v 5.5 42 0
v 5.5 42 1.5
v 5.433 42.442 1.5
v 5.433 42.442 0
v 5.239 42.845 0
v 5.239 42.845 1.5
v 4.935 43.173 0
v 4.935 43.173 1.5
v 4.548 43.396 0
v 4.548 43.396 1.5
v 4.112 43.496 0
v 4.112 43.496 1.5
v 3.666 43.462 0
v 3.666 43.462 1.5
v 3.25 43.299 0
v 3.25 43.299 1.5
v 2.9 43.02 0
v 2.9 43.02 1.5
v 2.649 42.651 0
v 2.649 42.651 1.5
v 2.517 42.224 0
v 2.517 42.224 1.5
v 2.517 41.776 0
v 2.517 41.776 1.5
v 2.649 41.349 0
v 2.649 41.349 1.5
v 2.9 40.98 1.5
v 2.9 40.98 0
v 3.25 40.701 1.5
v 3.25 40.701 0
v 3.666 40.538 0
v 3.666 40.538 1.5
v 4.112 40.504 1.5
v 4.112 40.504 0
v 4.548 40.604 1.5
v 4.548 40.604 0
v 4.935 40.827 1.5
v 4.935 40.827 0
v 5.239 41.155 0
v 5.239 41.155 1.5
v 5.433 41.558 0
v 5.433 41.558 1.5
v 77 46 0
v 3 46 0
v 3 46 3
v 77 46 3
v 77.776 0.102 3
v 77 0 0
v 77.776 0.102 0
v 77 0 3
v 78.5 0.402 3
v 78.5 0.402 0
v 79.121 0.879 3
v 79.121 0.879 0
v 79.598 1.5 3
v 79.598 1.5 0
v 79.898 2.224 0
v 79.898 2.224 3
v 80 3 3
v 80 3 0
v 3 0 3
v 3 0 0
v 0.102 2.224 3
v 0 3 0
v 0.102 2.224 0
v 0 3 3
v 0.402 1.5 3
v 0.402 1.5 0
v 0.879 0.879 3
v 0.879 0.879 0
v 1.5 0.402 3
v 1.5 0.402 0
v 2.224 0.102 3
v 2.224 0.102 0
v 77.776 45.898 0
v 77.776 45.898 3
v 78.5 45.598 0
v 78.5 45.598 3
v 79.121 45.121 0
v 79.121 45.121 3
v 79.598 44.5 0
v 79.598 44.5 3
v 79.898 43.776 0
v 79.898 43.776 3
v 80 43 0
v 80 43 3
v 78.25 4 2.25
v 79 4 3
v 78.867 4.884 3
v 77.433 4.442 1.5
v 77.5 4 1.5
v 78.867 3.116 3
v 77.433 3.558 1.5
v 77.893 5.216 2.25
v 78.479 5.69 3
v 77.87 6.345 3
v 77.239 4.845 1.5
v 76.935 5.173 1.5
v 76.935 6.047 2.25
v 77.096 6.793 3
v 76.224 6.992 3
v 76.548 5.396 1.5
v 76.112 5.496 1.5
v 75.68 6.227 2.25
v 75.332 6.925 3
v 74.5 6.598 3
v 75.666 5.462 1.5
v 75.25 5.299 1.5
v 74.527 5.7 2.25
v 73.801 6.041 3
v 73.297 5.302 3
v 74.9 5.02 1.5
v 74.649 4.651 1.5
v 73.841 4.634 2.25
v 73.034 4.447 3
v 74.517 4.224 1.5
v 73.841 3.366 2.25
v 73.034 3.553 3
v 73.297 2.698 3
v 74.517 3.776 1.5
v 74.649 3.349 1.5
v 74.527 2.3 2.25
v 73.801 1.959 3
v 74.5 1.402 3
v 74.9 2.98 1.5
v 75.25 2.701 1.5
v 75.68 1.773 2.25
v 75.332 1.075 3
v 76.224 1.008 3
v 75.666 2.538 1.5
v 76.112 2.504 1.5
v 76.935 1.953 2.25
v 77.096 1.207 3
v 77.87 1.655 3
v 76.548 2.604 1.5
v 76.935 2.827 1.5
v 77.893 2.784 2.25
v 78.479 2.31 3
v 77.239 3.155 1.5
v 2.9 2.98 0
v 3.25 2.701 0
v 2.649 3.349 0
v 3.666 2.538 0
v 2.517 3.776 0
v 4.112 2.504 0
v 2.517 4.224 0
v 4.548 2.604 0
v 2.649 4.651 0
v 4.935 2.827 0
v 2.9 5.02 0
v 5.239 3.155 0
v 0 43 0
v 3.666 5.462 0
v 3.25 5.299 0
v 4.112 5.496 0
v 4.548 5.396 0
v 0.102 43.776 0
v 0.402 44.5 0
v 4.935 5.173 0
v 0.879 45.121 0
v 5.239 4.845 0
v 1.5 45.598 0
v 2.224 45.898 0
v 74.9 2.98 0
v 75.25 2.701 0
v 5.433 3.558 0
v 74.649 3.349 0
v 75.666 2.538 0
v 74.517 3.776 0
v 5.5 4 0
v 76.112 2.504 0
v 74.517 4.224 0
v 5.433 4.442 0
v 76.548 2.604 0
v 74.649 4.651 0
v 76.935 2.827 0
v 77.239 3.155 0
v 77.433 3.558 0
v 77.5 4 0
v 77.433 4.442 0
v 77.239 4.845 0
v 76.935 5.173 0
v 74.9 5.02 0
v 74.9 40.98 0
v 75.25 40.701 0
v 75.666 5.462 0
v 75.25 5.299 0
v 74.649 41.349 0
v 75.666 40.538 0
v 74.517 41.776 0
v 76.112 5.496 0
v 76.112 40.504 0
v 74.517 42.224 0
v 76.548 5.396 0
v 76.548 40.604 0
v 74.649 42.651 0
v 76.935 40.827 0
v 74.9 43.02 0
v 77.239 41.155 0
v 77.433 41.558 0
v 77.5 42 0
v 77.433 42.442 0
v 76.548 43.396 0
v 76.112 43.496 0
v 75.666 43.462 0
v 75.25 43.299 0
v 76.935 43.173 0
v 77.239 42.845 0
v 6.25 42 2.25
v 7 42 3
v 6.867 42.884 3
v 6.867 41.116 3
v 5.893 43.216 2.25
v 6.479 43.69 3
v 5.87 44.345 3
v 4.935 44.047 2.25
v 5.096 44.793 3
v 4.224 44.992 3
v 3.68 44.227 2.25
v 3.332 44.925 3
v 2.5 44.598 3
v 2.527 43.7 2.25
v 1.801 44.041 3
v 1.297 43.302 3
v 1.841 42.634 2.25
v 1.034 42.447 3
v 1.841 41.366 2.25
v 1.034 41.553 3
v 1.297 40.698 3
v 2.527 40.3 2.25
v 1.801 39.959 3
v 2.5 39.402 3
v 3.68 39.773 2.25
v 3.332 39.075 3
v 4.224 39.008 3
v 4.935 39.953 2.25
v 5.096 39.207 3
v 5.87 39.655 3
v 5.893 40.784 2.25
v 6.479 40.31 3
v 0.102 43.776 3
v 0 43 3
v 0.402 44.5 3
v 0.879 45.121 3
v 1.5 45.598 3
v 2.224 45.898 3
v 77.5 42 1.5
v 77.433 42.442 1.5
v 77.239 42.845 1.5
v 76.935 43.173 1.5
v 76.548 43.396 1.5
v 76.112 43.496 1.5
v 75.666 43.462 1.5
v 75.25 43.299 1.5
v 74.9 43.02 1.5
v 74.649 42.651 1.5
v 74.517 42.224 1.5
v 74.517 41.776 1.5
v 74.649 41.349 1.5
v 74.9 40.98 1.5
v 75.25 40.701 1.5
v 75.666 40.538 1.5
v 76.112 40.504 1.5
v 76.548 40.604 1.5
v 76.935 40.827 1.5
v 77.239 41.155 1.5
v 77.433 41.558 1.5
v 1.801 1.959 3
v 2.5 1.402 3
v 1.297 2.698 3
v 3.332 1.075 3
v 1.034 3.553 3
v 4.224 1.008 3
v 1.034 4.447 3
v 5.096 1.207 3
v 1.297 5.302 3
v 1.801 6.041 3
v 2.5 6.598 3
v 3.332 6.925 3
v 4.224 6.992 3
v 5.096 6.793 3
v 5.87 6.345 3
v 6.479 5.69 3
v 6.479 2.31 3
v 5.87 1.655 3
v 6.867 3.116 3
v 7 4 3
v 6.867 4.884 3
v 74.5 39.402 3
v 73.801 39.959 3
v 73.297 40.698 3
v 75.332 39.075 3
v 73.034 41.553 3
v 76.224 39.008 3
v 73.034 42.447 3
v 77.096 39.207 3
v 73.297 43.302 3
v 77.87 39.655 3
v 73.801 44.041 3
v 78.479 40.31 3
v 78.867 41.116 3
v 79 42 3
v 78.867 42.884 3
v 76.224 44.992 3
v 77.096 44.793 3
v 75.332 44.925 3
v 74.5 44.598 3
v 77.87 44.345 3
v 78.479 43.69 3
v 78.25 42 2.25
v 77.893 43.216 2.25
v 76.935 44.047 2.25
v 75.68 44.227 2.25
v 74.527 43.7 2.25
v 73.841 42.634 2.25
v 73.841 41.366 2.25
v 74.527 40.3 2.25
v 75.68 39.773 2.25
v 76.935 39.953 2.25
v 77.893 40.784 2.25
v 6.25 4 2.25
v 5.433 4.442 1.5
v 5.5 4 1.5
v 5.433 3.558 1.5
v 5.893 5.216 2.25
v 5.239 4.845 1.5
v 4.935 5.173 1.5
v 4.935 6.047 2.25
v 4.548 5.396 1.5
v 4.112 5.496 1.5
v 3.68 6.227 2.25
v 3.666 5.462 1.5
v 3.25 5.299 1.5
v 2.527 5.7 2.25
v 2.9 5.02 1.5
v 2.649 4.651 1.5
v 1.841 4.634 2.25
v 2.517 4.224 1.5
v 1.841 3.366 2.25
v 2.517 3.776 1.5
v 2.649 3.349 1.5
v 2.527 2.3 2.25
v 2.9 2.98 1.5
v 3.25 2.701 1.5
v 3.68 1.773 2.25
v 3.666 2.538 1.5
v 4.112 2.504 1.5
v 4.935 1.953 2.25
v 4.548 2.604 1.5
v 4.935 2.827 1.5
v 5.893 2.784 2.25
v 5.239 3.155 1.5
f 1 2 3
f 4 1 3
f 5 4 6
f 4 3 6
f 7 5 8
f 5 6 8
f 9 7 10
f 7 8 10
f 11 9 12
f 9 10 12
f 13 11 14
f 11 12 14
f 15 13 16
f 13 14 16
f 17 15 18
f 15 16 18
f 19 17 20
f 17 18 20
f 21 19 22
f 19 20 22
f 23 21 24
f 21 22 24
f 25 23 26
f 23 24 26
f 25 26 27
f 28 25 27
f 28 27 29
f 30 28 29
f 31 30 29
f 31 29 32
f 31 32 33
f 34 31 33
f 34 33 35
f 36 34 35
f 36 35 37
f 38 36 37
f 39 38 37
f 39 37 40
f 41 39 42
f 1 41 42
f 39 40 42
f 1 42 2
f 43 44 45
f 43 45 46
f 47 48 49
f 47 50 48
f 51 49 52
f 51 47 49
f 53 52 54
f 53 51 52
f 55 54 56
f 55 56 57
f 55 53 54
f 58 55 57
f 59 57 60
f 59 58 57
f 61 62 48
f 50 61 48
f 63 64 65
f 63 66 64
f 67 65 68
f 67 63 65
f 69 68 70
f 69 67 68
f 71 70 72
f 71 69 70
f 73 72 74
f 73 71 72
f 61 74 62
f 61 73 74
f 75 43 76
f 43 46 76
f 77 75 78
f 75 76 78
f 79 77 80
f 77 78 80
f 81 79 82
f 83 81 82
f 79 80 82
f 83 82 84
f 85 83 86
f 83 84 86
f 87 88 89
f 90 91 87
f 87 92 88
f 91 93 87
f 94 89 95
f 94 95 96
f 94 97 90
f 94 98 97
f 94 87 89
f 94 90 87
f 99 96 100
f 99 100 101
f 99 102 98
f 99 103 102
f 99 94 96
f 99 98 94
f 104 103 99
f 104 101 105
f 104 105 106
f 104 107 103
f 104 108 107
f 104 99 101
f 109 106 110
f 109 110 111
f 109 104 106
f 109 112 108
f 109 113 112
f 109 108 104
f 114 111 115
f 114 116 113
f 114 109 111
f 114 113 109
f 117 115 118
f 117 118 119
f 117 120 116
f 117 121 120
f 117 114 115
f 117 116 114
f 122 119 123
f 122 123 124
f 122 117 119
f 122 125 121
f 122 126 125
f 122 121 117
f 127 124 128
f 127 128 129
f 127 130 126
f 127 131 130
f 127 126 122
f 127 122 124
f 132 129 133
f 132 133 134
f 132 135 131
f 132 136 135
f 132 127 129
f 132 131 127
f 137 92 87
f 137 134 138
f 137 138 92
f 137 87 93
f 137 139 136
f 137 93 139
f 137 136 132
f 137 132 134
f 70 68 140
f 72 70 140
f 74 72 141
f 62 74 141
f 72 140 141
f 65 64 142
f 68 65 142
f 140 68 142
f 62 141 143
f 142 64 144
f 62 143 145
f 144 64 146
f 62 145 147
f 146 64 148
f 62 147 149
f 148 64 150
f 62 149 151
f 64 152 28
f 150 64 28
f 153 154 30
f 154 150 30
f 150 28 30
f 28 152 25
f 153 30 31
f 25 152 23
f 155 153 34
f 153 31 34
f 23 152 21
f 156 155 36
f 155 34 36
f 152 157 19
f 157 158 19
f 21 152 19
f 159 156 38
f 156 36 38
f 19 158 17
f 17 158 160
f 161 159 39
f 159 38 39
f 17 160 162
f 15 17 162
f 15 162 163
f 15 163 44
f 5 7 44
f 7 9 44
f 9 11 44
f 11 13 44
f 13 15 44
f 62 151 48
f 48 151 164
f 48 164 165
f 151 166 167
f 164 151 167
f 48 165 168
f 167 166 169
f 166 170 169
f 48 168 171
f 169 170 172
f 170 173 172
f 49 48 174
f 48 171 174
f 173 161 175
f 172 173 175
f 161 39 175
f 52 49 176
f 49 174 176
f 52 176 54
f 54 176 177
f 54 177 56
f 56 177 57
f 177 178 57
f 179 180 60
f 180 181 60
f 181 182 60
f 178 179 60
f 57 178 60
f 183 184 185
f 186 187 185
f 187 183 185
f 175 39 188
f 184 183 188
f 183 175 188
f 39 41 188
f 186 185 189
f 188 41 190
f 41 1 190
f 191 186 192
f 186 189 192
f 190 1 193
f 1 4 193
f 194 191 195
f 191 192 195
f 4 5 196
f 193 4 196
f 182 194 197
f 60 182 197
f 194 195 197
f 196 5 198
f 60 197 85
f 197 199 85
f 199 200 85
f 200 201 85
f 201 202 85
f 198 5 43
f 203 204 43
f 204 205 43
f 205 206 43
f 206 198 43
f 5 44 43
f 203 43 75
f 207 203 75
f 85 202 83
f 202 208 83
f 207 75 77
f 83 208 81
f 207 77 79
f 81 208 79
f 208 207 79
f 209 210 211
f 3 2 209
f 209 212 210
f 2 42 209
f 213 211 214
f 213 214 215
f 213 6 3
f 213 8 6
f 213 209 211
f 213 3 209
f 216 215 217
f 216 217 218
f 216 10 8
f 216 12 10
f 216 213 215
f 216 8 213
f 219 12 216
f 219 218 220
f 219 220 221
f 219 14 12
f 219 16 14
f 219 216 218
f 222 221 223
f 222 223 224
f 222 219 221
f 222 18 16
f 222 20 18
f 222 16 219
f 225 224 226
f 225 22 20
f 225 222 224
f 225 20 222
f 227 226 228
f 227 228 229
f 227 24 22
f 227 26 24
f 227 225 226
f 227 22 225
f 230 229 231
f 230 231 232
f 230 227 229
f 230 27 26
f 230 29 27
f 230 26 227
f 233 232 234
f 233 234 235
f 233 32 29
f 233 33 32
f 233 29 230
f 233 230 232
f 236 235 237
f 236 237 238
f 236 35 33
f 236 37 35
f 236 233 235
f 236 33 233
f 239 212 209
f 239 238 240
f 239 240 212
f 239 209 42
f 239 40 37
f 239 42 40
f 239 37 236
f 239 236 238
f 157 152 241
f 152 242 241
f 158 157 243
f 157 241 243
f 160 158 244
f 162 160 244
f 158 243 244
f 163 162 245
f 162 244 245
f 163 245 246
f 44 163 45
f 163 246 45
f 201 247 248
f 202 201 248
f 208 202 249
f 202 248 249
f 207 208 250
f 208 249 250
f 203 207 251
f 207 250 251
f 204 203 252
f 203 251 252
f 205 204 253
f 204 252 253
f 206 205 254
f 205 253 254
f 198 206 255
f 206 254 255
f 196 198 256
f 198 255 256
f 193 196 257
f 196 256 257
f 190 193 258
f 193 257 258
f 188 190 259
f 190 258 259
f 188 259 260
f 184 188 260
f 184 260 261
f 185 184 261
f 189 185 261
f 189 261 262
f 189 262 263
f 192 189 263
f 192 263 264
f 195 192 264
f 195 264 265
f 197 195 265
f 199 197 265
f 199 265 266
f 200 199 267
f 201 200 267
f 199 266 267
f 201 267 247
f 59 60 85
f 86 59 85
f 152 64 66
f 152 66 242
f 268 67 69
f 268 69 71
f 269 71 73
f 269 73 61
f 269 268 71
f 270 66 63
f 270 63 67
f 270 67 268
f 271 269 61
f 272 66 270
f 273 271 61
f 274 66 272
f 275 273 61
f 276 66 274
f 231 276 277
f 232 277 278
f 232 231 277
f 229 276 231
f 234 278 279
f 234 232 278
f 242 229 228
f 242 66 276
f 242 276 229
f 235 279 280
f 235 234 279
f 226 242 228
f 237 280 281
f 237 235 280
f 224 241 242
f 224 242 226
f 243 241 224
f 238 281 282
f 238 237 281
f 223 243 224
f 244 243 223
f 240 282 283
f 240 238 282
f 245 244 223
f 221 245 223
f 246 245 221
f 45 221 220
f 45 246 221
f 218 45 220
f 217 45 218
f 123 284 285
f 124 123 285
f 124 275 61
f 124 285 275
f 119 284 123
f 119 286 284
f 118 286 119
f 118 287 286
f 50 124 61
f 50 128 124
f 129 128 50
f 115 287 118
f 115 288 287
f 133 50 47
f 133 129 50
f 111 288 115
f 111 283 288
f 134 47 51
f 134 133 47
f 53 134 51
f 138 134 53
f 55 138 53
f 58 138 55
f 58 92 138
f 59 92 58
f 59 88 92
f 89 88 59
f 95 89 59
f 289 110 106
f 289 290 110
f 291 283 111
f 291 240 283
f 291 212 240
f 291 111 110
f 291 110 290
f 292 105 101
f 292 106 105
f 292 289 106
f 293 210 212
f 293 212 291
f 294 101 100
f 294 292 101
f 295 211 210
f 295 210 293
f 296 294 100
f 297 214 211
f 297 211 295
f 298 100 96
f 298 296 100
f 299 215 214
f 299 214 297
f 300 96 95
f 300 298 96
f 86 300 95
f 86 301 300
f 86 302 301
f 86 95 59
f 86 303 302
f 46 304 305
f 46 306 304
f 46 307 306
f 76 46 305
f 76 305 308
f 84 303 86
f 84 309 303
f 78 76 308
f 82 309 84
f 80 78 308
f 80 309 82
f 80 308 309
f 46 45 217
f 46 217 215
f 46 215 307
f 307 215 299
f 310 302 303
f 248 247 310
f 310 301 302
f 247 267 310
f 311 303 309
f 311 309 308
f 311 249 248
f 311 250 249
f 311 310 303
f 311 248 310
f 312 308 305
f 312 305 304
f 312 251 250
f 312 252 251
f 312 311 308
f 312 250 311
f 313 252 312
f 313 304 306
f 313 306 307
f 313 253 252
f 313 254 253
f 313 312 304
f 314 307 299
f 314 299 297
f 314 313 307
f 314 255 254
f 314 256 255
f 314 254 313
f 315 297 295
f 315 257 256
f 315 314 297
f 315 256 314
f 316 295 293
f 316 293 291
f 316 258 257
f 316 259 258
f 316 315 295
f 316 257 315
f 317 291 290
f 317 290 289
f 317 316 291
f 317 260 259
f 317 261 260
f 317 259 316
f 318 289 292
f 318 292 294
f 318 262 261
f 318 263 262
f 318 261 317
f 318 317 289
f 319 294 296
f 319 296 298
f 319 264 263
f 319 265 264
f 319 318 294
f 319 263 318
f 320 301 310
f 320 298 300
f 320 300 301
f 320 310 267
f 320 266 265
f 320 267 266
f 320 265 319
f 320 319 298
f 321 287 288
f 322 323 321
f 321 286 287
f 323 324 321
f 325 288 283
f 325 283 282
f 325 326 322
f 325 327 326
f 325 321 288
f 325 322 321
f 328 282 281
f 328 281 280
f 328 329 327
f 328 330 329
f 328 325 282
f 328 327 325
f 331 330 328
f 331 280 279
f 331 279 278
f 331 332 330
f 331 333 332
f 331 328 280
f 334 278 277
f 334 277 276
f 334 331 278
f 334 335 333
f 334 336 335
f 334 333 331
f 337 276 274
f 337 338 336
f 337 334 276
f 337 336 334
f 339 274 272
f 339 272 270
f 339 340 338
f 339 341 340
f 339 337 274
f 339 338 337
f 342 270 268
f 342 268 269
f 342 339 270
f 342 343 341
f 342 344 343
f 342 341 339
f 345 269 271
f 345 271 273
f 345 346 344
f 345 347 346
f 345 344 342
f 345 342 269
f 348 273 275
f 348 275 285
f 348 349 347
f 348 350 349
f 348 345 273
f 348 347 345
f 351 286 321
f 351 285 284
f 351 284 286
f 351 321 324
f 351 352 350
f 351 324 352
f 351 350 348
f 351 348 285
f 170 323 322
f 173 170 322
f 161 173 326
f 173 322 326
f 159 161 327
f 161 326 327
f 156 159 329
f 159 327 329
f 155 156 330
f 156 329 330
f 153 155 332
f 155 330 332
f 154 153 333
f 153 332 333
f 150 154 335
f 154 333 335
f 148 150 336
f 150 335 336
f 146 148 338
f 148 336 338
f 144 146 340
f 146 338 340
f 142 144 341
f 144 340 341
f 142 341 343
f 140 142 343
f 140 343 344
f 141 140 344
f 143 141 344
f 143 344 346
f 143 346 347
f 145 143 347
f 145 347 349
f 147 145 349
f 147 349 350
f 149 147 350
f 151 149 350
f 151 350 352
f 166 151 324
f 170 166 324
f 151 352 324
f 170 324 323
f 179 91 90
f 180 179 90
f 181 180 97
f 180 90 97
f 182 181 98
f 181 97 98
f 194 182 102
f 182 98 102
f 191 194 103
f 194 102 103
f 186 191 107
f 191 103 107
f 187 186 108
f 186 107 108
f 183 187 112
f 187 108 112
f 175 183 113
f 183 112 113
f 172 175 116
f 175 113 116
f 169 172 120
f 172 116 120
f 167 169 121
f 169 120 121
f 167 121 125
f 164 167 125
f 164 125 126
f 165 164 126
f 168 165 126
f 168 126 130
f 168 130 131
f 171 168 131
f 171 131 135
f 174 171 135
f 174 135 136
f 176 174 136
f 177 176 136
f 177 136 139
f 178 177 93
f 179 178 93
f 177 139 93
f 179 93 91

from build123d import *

# Parameters (mm, degrees)
SKETCH_W     = 80
SKETCH_H     = 46
PAD_DEPTH    = 3
FILLET_R     = 3
FILLET001_R  = 3
SKETCH001_R  = 1.5
POCKET_DEPTH = 3
CHAMFER_SIZE = 1.5


with BuildPart() as part:
    # Sketch → Pad (new body)
    with BuildSketch(Plane.XY):
        with Locations((40, 23)):
            Rectangle(SKETCH_W, SKETCH_H)
    extrude(amount=PAD_DEPTH)

    # Fillet
    fillet_edges = [part.edges().sort_by_distance(p)[0] for p in [
        (80, 0, 1.5),
        (0, 0, 1.5),
    ]]
    fillet(fillet_edges, radius=FILLET_R)

    # Fillet001
    fillet001_edges = [part.edges().sort_by_distance(p)[0] for p in [
        (80, 46, 1.5),
        (0, 46, 1.5),
    ]]
    fillet(fillet001_edges, radius=FILLET001_R)

    # Sketch001 → Pocket (cut)
    with BuildSketch(Plane.XY.offset(3)):
        with Locations((4, 42)):
            Circle(SKETCH001_R)
        with Locations((4, 4)):
            Circle(SKETCH001_R)
        with Locations((76, 4)):
            Circle(SKETCH001_R)
        with Locations((76, 42)):
            Circle(SKETCH001_R)
    extrude(amount=-POCKET_DEPTH, mode=Mode.SUBTRACT)

    # Chamfer
    chamfer_edges = [part.edges().sort_by_distance(p)[0] for p in [
        (2.5, 42, 3),
        (2.5, 4, 3),
        (74.5, 4, 3),
        (74.5, 42, 3),
    ]]
    chamfer(chamfer_edges, length=CHAMFER_SIZE)


solid = part.part
